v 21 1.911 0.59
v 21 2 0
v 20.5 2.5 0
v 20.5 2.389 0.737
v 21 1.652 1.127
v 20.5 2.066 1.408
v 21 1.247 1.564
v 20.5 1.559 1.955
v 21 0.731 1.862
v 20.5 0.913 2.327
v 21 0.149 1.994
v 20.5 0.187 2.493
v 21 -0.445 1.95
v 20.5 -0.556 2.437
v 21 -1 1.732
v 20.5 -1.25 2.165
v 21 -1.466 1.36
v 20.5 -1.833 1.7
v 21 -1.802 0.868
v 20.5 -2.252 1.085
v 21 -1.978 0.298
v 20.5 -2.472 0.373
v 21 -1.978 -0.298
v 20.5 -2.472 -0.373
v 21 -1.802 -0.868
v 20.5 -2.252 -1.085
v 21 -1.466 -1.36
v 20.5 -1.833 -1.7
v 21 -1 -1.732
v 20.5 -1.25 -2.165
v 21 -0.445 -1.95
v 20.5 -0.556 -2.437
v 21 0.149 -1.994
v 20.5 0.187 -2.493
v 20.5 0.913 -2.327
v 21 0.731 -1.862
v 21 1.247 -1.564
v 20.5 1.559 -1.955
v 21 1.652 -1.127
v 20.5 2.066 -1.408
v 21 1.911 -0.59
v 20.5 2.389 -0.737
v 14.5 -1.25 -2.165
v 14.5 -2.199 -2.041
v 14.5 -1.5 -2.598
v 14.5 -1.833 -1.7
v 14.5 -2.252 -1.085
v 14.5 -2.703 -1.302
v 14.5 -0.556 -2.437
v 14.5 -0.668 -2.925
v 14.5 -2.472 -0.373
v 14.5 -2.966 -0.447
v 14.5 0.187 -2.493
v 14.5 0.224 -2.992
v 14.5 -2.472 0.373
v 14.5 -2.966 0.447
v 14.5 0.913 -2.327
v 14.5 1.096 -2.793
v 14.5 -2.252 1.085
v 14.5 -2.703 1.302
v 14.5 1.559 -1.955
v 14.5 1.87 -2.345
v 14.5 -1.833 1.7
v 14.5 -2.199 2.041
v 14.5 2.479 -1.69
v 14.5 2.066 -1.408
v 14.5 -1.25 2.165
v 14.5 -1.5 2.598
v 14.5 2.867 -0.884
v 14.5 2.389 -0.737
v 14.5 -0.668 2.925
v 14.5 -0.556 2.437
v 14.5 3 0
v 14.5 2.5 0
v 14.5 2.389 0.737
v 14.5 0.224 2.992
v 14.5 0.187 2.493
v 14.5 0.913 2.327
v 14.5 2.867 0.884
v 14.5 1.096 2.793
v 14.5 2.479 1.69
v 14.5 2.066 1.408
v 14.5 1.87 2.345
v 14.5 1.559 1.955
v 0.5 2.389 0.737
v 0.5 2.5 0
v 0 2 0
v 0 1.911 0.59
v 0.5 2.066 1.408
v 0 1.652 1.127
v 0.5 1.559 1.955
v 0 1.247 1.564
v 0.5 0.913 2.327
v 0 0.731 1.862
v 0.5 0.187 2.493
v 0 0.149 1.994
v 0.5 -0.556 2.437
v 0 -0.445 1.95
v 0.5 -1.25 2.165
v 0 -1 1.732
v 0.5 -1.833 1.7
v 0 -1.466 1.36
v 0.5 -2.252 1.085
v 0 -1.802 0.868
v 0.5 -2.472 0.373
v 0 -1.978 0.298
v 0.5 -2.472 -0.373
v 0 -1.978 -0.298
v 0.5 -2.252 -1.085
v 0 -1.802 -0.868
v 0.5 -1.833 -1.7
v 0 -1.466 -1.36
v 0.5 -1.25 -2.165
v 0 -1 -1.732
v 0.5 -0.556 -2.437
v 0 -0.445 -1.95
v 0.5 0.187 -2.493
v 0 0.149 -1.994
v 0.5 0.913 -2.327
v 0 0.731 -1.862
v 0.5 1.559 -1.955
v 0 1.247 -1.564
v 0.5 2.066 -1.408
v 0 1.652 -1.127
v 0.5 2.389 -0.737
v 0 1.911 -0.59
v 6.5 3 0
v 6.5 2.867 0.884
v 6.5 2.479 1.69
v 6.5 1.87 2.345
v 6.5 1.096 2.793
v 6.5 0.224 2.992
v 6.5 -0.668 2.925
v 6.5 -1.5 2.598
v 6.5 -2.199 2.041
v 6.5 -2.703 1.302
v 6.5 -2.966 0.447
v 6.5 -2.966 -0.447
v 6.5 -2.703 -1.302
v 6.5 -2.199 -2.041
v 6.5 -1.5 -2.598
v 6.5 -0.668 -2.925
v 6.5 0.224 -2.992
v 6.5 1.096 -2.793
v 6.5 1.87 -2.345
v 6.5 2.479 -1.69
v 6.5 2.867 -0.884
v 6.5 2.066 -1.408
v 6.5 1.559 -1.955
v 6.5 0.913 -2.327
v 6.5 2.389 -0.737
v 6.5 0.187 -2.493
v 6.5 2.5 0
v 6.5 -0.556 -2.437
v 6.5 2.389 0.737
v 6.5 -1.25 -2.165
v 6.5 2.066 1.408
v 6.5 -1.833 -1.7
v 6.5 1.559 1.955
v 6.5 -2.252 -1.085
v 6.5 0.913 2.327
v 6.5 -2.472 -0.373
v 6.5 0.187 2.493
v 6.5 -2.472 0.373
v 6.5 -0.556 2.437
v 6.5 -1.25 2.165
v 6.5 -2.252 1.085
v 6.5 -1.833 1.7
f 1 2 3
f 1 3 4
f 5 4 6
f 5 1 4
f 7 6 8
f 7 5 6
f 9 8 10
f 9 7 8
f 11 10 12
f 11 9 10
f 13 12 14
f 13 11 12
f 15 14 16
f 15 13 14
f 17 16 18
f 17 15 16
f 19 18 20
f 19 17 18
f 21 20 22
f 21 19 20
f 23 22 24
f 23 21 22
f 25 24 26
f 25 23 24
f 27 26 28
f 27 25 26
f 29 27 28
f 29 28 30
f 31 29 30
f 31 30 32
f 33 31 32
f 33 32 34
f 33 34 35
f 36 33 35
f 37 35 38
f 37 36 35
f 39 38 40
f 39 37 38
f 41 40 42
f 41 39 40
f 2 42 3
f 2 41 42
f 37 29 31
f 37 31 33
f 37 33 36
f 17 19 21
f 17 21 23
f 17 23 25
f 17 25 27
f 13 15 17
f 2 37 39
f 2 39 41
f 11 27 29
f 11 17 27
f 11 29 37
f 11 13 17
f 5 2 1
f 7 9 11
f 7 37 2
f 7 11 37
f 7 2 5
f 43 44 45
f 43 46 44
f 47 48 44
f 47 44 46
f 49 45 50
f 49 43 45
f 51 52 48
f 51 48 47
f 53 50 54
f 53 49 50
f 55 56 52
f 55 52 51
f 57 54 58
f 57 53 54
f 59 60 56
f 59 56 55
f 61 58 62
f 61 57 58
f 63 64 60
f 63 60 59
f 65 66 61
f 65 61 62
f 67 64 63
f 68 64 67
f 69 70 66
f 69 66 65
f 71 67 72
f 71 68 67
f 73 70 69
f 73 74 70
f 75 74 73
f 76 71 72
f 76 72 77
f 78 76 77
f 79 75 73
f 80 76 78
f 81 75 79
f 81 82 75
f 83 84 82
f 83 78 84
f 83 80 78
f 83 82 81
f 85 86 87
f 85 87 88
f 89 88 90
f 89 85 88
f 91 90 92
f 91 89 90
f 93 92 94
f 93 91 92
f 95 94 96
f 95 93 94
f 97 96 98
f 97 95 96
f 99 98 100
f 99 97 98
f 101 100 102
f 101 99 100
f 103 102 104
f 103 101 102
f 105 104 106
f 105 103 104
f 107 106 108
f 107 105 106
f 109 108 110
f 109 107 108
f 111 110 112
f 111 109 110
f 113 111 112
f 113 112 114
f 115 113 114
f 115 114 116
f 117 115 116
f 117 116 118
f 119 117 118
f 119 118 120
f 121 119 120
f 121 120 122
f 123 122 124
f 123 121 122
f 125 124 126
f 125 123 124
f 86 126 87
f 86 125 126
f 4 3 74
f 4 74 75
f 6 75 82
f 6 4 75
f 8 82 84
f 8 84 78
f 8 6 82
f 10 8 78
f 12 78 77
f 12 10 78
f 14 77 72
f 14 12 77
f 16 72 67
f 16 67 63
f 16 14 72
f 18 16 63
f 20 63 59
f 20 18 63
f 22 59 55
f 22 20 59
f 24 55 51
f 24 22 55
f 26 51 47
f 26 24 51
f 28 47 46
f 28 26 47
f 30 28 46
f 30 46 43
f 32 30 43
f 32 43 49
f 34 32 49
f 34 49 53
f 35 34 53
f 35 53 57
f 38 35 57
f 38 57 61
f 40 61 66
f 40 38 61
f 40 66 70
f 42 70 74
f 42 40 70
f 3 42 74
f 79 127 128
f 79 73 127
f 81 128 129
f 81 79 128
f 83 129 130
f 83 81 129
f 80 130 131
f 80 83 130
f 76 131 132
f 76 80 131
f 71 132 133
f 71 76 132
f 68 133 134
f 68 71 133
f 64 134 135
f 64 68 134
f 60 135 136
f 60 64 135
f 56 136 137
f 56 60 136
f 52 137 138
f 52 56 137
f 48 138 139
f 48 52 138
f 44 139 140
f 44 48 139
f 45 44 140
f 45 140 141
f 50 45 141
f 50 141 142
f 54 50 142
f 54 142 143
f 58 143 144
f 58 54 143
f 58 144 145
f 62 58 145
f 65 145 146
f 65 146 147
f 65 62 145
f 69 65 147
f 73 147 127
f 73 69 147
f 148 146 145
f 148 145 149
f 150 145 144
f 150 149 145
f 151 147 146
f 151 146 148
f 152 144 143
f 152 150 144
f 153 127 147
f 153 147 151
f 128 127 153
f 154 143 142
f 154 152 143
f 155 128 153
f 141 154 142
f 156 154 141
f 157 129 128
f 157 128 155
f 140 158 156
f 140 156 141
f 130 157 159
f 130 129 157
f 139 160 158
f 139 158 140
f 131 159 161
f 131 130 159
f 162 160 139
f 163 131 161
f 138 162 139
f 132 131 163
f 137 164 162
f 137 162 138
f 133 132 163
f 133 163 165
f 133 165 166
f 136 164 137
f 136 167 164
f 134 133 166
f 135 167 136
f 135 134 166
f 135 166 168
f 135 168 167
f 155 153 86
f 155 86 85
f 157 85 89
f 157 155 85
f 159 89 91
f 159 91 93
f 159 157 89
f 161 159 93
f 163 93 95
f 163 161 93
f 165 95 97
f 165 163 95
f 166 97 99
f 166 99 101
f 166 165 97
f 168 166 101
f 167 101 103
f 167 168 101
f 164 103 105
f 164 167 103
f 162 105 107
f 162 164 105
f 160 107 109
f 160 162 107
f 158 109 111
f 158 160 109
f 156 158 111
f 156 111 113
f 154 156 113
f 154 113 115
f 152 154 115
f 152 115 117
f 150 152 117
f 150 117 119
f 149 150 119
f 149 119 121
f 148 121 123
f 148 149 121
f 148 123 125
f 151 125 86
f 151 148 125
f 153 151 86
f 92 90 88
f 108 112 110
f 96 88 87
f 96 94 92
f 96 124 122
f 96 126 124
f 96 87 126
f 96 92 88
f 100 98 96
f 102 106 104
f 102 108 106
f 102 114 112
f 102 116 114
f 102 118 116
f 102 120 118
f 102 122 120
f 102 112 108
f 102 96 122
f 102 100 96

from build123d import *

# Parameters (mm, degrees)
CHANFREIN1_SIZE = 0.5


with BuildPart() as part:
    # Esquisse1 → Révolution1 (revolve)
    with BuildSketch(Plane.XY):
        Polygon((0, 0), (0, 2.5), (6.5, 2.5), (6.5, 3), (14.5, 3), (14.5, 2.5), (21, 2.5), (21, 0), align=None)
    revolve(axis=Axis((-54.824636662, 0, 0), (1, 0, 0)))

    # Chanfrein1
    chanfrein1_edges = [part.edges().sort_by_distance(p)[0] for p in [
        (21, -2.5, 0),
        (0, -2.5, 0),
    ]]
    chamfer(chanfrein1_edges, length=CHANFREIN1_SIZE)


solid = part.part
